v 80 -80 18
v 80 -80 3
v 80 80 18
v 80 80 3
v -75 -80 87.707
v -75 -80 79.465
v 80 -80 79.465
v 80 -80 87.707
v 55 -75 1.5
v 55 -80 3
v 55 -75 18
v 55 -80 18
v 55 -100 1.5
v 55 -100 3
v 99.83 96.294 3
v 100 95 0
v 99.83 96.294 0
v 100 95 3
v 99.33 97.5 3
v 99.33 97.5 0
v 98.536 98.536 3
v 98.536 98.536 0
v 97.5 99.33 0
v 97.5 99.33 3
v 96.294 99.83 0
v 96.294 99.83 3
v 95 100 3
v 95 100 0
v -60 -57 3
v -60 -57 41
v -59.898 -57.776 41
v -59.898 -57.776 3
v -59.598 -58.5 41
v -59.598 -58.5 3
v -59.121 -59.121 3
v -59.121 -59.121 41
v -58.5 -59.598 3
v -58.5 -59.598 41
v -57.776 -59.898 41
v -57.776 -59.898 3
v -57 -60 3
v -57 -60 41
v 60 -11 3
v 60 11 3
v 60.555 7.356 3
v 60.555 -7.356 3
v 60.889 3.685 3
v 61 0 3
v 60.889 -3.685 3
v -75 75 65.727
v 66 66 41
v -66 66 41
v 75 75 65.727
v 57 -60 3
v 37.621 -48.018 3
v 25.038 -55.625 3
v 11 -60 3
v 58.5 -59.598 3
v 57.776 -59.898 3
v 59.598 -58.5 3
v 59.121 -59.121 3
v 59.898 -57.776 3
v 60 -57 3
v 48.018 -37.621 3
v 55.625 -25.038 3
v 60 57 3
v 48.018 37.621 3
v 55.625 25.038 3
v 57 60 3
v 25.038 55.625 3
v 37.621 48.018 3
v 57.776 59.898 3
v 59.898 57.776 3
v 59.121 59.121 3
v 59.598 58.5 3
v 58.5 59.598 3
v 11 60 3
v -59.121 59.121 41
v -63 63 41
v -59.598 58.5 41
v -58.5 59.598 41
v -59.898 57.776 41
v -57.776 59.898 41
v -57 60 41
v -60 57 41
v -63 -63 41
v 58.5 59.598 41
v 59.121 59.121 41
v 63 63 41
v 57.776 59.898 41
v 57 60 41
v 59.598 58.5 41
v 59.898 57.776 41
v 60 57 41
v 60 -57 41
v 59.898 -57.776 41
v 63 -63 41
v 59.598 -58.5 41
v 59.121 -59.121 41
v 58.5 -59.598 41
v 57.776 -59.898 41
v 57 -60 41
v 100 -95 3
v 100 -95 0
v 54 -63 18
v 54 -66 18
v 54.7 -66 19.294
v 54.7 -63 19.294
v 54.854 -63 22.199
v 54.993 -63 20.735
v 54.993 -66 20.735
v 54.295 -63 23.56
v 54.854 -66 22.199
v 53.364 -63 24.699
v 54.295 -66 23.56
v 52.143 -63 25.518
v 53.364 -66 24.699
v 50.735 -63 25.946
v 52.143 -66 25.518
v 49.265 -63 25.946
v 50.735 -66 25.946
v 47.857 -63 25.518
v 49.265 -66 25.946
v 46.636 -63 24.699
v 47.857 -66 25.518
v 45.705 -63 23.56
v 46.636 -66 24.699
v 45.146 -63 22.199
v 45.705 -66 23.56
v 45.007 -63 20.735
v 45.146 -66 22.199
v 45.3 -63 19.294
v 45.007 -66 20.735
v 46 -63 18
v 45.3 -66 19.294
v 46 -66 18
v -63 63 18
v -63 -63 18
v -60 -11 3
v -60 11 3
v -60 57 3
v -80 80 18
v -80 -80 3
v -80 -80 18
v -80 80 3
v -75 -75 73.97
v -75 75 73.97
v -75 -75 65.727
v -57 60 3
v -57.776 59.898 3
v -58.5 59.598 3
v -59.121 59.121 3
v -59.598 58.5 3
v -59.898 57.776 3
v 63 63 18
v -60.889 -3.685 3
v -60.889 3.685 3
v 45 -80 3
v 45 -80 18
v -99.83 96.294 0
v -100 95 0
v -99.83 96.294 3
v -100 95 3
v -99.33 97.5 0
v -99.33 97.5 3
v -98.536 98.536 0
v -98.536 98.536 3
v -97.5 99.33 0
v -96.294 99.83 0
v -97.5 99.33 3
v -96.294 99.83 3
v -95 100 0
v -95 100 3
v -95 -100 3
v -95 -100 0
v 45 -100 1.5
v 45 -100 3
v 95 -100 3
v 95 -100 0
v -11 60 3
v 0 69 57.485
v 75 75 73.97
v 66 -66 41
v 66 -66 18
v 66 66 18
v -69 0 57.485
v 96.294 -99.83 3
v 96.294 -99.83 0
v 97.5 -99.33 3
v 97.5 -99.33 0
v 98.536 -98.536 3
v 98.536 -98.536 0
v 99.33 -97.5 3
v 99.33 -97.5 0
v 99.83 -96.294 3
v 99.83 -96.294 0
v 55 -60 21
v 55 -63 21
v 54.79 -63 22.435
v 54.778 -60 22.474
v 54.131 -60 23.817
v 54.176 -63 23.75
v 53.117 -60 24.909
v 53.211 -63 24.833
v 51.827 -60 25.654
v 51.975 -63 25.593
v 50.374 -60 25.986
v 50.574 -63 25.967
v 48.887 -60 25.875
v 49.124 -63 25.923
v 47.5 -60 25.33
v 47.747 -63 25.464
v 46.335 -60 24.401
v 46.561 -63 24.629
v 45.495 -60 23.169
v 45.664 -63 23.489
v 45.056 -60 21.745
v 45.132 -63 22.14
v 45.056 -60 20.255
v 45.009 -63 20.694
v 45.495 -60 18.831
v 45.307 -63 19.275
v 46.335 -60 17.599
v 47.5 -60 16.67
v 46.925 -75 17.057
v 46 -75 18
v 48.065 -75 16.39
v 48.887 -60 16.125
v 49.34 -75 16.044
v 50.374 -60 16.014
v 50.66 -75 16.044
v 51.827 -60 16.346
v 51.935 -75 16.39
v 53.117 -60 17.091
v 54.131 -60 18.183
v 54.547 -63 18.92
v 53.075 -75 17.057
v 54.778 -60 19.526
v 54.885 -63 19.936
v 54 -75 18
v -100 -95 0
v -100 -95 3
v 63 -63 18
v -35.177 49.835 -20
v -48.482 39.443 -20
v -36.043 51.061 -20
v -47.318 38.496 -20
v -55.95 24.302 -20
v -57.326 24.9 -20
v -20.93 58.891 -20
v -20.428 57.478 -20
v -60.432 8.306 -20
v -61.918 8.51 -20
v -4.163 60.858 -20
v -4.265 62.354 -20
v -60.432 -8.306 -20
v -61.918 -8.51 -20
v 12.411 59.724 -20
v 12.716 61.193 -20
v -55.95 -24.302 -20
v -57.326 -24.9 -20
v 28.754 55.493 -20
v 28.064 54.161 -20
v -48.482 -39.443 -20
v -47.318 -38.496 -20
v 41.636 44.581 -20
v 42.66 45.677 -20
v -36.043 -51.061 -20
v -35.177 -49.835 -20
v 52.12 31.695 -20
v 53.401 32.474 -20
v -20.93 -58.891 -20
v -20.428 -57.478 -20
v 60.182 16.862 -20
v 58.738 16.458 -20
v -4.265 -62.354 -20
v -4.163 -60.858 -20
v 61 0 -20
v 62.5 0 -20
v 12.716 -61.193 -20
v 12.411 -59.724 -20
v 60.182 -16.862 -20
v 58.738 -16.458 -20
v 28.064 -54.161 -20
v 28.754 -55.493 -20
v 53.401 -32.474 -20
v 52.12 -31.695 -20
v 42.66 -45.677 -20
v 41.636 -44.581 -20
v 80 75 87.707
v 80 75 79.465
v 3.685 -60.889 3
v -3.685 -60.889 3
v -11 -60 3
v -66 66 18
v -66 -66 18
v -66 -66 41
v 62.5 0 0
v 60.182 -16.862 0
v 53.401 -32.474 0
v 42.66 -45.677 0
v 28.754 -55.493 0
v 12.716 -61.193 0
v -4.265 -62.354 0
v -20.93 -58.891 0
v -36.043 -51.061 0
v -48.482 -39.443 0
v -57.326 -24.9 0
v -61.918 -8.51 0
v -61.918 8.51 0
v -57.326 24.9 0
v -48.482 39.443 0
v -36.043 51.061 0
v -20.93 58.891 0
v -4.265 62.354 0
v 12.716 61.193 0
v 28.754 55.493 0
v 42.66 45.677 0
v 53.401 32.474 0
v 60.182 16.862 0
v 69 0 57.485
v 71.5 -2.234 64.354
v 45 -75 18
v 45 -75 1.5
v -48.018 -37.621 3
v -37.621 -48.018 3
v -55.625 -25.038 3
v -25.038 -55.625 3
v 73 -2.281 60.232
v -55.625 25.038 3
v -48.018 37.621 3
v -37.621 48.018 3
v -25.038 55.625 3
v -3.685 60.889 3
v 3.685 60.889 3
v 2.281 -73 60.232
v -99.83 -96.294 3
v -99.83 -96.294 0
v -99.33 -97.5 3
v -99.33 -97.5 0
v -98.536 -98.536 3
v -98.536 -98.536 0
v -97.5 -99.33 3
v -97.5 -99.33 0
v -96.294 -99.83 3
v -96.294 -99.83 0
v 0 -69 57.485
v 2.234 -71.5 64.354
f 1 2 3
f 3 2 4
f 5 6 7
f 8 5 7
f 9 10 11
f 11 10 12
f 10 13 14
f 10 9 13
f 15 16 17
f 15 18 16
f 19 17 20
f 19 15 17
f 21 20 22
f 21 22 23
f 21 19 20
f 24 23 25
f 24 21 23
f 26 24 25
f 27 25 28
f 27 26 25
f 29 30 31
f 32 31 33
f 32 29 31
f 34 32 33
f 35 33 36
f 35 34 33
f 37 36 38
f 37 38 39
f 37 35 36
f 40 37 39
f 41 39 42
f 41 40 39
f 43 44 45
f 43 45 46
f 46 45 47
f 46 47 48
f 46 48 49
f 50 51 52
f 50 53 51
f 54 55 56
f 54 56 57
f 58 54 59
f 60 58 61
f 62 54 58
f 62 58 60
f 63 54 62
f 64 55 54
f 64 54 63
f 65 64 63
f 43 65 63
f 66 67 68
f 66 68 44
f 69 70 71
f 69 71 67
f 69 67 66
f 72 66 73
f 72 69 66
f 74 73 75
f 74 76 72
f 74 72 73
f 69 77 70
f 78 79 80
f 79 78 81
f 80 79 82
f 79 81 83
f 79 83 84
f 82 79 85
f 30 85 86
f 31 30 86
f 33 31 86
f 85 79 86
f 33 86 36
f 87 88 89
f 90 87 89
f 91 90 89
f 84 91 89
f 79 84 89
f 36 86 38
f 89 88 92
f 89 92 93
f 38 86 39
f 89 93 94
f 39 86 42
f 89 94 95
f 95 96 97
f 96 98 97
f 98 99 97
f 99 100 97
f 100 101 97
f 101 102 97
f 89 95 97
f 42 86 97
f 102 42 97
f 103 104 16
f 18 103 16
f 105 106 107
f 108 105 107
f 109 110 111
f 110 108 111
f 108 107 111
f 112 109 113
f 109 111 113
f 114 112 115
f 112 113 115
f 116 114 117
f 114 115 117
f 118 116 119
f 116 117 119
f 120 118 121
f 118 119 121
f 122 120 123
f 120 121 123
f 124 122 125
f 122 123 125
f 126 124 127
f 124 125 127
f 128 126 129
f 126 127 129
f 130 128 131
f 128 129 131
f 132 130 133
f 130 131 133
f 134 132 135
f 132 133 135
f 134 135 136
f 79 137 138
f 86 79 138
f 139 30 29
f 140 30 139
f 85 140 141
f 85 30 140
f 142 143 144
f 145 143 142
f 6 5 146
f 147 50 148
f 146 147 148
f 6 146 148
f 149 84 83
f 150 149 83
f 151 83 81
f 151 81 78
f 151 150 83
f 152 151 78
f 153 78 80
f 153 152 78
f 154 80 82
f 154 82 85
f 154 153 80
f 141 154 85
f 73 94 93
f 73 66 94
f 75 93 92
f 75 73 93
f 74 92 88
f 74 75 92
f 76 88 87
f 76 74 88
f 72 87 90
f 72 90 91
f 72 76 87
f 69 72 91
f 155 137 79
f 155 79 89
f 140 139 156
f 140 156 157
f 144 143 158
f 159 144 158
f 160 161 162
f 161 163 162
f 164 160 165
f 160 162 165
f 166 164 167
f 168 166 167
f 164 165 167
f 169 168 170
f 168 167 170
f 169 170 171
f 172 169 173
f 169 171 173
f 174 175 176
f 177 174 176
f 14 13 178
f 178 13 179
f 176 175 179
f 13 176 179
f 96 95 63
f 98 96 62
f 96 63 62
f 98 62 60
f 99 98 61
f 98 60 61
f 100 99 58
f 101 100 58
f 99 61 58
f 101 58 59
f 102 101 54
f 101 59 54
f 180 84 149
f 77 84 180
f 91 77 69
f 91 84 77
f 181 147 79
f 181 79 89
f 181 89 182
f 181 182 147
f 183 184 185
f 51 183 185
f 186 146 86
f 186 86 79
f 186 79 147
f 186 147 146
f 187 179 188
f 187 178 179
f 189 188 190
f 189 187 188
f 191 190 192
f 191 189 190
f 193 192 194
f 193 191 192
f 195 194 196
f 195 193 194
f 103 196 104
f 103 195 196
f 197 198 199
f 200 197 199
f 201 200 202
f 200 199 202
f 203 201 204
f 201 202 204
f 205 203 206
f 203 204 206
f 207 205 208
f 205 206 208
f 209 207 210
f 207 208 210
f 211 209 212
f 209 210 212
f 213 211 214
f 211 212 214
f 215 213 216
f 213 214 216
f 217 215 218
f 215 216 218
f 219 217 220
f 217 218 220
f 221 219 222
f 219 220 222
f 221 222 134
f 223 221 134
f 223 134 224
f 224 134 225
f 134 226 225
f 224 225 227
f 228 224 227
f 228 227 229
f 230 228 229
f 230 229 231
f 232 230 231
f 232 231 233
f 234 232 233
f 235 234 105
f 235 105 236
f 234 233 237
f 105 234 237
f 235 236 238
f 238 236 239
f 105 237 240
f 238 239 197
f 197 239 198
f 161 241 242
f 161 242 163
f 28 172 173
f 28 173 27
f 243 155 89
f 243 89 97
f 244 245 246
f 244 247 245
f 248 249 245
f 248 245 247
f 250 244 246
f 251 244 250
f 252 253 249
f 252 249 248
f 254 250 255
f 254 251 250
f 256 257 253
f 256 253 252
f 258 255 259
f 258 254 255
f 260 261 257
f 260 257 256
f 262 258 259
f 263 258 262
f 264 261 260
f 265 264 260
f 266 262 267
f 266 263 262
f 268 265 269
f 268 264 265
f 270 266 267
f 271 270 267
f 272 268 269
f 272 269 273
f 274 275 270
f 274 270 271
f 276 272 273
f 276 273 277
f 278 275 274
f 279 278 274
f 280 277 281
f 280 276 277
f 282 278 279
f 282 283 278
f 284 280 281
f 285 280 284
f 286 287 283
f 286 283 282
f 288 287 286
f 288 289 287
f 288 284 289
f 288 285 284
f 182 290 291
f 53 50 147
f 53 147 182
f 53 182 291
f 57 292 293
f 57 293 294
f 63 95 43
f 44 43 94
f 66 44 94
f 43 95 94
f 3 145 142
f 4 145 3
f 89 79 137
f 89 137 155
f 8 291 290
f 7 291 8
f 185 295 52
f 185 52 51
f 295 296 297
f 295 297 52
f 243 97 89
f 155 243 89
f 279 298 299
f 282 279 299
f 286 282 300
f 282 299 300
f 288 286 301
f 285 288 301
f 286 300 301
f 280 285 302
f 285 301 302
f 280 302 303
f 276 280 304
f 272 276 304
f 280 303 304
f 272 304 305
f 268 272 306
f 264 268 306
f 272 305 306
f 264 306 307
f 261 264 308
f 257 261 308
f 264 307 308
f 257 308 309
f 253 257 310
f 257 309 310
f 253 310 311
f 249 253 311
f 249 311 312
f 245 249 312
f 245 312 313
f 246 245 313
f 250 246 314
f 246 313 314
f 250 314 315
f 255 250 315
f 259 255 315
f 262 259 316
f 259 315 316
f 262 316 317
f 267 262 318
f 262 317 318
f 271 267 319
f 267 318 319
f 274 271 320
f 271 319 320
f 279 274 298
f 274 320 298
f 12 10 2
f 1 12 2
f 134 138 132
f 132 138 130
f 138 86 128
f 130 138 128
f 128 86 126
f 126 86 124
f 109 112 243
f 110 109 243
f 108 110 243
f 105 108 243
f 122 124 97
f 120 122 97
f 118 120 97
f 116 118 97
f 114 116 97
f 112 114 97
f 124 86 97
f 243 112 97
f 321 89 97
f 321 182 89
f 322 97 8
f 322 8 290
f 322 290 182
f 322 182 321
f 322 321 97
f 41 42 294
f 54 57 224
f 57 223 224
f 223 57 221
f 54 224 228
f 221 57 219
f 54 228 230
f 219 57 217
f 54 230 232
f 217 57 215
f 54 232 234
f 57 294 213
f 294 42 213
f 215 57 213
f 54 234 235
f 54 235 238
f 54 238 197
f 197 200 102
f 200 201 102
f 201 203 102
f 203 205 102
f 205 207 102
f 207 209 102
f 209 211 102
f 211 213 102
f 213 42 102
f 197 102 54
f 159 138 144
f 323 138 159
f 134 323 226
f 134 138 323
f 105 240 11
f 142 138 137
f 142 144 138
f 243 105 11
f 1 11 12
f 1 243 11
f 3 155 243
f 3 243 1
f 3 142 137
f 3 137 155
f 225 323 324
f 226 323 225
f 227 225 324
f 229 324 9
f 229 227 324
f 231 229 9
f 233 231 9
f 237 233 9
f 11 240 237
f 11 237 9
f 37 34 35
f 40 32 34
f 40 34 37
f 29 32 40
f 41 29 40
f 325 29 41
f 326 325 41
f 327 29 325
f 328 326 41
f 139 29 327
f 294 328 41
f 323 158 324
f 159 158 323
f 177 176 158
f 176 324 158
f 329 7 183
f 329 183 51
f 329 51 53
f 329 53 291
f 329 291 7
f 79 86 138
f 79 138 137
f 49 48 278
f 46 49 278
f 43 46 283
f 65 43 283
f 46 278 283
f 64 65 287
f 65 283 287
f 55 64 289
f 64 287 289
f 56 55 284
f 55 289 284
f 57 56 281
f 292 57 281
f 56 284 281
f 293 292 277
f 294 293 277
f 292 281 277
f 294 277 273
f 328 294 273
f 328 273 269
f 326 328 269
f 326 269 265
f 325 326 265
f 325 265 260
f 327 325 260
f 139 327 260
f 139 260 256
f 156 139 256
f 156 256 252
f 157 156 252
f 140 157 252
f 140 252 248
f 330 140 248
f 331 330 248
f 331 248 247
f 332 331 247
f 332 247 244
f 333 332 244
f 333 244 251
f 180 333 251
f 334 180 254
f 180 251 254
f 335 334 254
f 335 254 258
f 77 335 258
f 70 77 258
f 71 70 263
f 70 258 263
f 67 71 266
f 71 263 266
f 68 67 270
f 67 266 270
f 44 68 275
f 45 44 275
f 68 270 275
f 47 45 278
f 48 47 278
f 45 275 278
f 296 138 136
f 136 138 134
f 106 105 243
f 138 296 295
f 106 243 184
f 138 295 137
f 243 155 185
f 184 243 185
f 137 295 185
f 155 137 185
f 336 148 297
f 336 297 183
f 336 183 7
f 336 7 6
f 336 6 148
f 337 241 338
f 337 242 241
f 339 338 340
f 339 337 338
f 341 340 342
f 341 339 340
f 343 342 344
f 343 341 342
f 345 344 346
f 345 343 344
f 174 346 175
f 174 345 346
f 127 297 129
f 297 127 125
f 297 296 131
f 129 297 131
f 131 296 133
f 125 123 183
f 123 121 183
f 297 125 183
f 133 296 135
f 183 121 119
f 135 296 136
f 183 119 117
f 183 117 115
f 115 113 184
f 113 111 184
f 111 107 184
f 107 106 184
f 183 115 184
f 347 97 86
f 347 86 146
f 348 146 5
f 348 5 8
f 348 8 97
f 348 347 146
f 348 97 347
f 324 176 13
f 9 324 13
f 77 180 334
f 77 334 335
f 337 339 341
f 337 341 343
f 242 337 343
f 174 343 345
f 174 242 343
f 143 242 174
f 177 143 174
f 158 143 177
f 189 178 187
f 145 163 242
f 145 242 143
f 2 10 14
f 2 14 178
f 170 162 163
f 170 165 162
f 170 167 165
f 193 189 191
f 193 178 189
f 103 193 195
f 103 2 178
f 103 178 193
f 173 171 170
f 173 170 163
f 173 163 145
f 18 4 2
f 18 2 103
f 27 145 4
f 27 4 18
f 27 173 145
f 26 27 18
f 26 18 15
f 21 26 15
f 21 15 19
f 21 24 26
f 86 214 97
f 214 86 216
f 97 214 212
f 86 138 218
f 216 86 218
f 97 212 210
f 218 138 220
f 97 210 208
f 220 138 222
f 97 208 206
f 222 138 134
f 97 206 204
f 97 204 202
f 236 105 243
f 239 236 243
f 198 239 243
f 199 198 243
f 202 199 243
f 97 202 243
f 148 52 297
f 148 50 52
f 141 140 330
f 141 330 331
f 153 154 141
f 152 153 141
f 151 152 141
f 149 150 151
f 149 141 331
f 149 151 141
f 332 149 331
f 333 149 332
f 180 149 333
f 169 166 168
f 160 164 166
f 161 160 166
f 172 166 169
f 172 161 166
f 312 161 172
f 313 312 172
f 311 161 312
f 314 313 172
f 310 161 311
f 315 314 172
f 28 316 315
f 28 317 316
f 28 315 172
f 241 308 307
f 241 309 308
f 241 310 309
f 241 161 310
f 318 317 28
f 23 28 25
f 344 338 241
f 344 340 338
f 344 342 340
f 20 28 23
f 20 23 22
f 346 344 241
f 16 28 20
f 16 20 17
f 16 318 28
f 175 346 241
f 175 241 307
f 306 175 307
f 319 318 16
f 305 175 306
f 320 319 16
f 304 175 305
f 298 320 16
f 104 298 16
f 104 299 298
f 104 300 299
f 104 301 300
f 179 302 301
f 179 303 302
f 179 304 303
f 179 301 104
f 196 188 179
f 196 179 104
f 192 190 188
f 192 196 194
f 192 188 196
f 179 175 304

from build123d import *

# Parameters (mm, degrees)
SKETCH_W             = 200
SKETCH_H             = 200
PAD_DEPTH            = 3
FILLET_R             = 5
SKETCH001_W          = 160
SKETCH001_H          = 160
PAD001_DEPTH         = 15
SKETCH002_W          = 126
SKETCH002_H          = 126
PAD002_DEPTH         = 41
SKETCH004_R          = 62.5
PAD003_DEPTH         = 20
SKETCH005_R          = 61
POCKET001_DEPTH      = 23
SKETCH006_R          = 5
POCKET002_DEPTH      = 5
POCKET002_DEPTH_BACK = 20
SKETCH007_W          = 10
SKETCH007_H          = 20
POCKET003_DEPTH      = 25
SKETCH003_W          = 120
SKETCH003_H          = 120
POCKET_DEPTH         = 38
FILLET001_R          = 3
SKETCH008_W          = 132
SKETCH008_H          = 132
PAD004_DEPTH         = 23
SKETCH009_W          = 126
SKETCH009_H          = 126
POCKET004_DEPTH      = 23
SKETCH010_W          = 132
SKETCH010_H          = 132
PAD005_DEPTH         = 55
PAD005_TAPER         = -20
SKETCH011_W          = 126
SKETCH011_H          = 126
POCKET005_DEPTH      = 55
POCKET005_TAPER      = -20
SKETCH012_R          = 5
POCKET006_DEPTH      = 5
SKETCH013_W          = 80
SKETCH013_H          = 200
POCKET007_DEPTH      = 78.001
SKETCH014_W          = 200
SKETCH014_H          = 80
POCKET008_DEPTH      = 78.001
SKETCH015_W          = 80
SKETCH015_H          = 200
POCKET009_DEPTH      = 78.001
SKETCH016_W          = 200
SKETCH016_H          = 80
POCKET010_DEPTH      = 78.001


with BuildPart() as body:
    # Sketch → Pad (new body)
    with BuildSketch(Plane.XY):
        Rectangle(SKETCH_W, SKETCH_H)
    extrude(amount=PAD_DEPTH)

    # Fillet
    fillet_edges = [body.edges().sort_by_distance(p)[0] for p in [
        (100, 100, 1.5),
        (100, -100, 1.5),
        (-100, 100, 1.5),
        (-100, -100, 1.5),
    ]]
    fillet(fillet_edges, radius=FILLET_R)

    # Sketch001 (on Face5 of Fillet) → Pad001 (join)
    with BuildSketch(Plane.XY.offset(3)):
        Rectangle(SKETCH001_W, SKETCH001_H)
    extrude(amount=PAD001_DEPTH)

    # Sketch002 (on Face2 of Pad001) → Pad002 (join)
    with BuildSketch(Plane(origin=(0, 0, 0), x_dir=(1, 0, 0), z_dir=(0, 0, -1))):
        Rectangle(SKETCH002_W, SKETCH002_H)
    extrude(amount=-PAD002_DEPTH)

    # Sketch004 → Pad003 (join)
    with BuildSketch(Plane(origin=(0, 0, 0), x_dir=(1, 0, 0), z_dir=(0, 0, -1))):
        Circle(SKETCH004_R)
    extrude(amount=PAD003_DEPTH)

    # Sketch005 (on Face16 of Pad003) → Pocket001 (cut)
    with BuildSketch(Plane(origin=(0, 0, -20), x_dir=(1, 0, 0), z_dir=(0, 0, -1))):
        Circle(SKETCH005_R)
    extrude(amount=-POCKET001_DEPTH, mode=Mode.SUBTRACT)

    # Sketch006 (on Face20 of Pocket001) → Pocket002 (cut, two sides)
    with BuildSketch(Plane.XZ.offset(63)) as pocket002_sk:
        with Locations((50, 21)):
            Circle(SKETCH006_R)
    extrude(amount=-POCKET002_DEPTH, mode=Mode.SUBTRACT)
    extrude(pocket002_sk.sketch, amount=POCKET002_DEPTH_BACK, mode=Mode.SUBTRACT)

    # Sketch007 (on Face7 of Pocket002) → Pocket003 (cut)
    with BuildSketch(Plane.XZ.offset(100)):
        with Locations((50, 11.5)):
            Rectangle(SKETCH007_W, SKETCH007_H)
    extrude(amount=-POCKET003_DEPTH, mode=Mode.SUBTRACT)

    # Sketch003 → Pocket (cut)
    with BuildSketch(Plane.XY.offset(41)):
        Rectangle(SKETCH003_W, SKETCH003_H)
    extrude(amount=-POCKET_DEPTH, mode=Mode.SUBTRACT)

    # Fillet001
    fillet001_edges = [body.edges().sort_by_distance(p)[0] for p in [
        (60, 60, 22),
        (-60, 60, 22),
        (-60, -60, 22),
        (60, -60, 22),
    ]]
    fillet(fillet001_edges, radius=FILLET001_R)


with BuildPart() as tpugasket:
    # Sketch008 (on Face1 of CopyFillet001) → Pad004 (new body)
    with BuildSketch(Plane.XY.offset(18)):
        Rectangle(SKETCH008_W, SKETCH008_H)
    extrude(amount=PAD004_DEPTH)

    # Sketch009 (on Face6 of Pad004) → Pocket004 (cut)
    with BuildSketch(Plane.XY.offset(41)):
        Rectangle(SKETCH009_W, SKETCH009_H)
    extrude(amount=-POCKET004_DEPTH, mode=Mode.SUBTRACT)

    # Sketch010 (on Face5 of Pocket004) → Pad005 (join)
    with BuildSketch(Plane.XY.offset(41)):
        Rectangle(SKETCH010_W, SKETCH010_H)
    extrude(amount=PAD005_DEPTH, taper=PAD005_TAPER)

    # Sketch011 (on Face15 of Pad005) → Pocket005 (cut)
    with BuildSketch(Plane(origin=(0, 0, 41), x_dir=(1, 0, 0), z_dir=(0, 0, -1))):
        Rectangle(SKETCH011_W, SKETCH011_H)
    extrude(amount=-POCKET005_DEPTH, taper=POCKET005_TAPER, mode=Mode.SUBTRACT)

    # Sketch012 (on Face3 of Pocket005) → Pocket006 (cut)
    with BuildSketch(Plane.XZ.offset(66)):
        with Locations((50, 21)):
            Circle(SKETCH012_R)
    extrude(amount=-POCKET006_DEPTH, mode=Mode.SUBTRACT)

    # Sketch013 (on Face4 of Pocket006) → Pocket007 (cut, through all)
    with BuildSketch(Plane(origin=(0, 0, 18), x_dir=(1, 0, 0), z_dir=(0, 0, -1))):
        with Locations((120, 0)):
            Rectangle(SKETCH013_W, SKETCH013_H)
    extrude(amount=-POCKET007_DEPTH, mode=Mode.SUBTRACT)

    # Sketch014 (on Face4 of Pocket007) → Pocket008 (cut, through all)
    with BuildSketch(Plane(origin=(0, 0, 18), x_dir=(1, 0, 0), z_dir=(0, 0, -1))):
        with Locations((0, 120)):
            Rectangle(SKETCH014_W, SKETCH014_H)
    extrude(amount=-POCKET008_DEPTH, mode=Mode.SUBTRACT)

    # Sketch015 (on Face4 of Pocket008) → Pocket009 (cut, through all)
    with BuildSketch(Plane(origin=(0, 0, 18), x_dir=(1, 0, 0), z_dir=(0, 0, -1))):
        with Locations((-115, 0)):
            Rectangle(SKETCH015_W, SKETCH015_H)
    extrude(amount=-POCKET009_DEPTH, mode=Mode.SUBTRACT)

    # Sketch016 (on Face4 of Pocket009) → Pocket010 (cut, through all)
    with BuildSketch(Plane(origin=(0, 0, 18), x_dir=(1, 0, 0), z_dir=(0, 0, -1))):
        with Locations((0, -115)):
            Rectangle(SKETCH016_W, SKETCH016_H)
    extrude(amount=-POCKET010_DEPTH, mode=Mode.SUBTRACT)


solid = Compound([body.part, tpugasket.part])
